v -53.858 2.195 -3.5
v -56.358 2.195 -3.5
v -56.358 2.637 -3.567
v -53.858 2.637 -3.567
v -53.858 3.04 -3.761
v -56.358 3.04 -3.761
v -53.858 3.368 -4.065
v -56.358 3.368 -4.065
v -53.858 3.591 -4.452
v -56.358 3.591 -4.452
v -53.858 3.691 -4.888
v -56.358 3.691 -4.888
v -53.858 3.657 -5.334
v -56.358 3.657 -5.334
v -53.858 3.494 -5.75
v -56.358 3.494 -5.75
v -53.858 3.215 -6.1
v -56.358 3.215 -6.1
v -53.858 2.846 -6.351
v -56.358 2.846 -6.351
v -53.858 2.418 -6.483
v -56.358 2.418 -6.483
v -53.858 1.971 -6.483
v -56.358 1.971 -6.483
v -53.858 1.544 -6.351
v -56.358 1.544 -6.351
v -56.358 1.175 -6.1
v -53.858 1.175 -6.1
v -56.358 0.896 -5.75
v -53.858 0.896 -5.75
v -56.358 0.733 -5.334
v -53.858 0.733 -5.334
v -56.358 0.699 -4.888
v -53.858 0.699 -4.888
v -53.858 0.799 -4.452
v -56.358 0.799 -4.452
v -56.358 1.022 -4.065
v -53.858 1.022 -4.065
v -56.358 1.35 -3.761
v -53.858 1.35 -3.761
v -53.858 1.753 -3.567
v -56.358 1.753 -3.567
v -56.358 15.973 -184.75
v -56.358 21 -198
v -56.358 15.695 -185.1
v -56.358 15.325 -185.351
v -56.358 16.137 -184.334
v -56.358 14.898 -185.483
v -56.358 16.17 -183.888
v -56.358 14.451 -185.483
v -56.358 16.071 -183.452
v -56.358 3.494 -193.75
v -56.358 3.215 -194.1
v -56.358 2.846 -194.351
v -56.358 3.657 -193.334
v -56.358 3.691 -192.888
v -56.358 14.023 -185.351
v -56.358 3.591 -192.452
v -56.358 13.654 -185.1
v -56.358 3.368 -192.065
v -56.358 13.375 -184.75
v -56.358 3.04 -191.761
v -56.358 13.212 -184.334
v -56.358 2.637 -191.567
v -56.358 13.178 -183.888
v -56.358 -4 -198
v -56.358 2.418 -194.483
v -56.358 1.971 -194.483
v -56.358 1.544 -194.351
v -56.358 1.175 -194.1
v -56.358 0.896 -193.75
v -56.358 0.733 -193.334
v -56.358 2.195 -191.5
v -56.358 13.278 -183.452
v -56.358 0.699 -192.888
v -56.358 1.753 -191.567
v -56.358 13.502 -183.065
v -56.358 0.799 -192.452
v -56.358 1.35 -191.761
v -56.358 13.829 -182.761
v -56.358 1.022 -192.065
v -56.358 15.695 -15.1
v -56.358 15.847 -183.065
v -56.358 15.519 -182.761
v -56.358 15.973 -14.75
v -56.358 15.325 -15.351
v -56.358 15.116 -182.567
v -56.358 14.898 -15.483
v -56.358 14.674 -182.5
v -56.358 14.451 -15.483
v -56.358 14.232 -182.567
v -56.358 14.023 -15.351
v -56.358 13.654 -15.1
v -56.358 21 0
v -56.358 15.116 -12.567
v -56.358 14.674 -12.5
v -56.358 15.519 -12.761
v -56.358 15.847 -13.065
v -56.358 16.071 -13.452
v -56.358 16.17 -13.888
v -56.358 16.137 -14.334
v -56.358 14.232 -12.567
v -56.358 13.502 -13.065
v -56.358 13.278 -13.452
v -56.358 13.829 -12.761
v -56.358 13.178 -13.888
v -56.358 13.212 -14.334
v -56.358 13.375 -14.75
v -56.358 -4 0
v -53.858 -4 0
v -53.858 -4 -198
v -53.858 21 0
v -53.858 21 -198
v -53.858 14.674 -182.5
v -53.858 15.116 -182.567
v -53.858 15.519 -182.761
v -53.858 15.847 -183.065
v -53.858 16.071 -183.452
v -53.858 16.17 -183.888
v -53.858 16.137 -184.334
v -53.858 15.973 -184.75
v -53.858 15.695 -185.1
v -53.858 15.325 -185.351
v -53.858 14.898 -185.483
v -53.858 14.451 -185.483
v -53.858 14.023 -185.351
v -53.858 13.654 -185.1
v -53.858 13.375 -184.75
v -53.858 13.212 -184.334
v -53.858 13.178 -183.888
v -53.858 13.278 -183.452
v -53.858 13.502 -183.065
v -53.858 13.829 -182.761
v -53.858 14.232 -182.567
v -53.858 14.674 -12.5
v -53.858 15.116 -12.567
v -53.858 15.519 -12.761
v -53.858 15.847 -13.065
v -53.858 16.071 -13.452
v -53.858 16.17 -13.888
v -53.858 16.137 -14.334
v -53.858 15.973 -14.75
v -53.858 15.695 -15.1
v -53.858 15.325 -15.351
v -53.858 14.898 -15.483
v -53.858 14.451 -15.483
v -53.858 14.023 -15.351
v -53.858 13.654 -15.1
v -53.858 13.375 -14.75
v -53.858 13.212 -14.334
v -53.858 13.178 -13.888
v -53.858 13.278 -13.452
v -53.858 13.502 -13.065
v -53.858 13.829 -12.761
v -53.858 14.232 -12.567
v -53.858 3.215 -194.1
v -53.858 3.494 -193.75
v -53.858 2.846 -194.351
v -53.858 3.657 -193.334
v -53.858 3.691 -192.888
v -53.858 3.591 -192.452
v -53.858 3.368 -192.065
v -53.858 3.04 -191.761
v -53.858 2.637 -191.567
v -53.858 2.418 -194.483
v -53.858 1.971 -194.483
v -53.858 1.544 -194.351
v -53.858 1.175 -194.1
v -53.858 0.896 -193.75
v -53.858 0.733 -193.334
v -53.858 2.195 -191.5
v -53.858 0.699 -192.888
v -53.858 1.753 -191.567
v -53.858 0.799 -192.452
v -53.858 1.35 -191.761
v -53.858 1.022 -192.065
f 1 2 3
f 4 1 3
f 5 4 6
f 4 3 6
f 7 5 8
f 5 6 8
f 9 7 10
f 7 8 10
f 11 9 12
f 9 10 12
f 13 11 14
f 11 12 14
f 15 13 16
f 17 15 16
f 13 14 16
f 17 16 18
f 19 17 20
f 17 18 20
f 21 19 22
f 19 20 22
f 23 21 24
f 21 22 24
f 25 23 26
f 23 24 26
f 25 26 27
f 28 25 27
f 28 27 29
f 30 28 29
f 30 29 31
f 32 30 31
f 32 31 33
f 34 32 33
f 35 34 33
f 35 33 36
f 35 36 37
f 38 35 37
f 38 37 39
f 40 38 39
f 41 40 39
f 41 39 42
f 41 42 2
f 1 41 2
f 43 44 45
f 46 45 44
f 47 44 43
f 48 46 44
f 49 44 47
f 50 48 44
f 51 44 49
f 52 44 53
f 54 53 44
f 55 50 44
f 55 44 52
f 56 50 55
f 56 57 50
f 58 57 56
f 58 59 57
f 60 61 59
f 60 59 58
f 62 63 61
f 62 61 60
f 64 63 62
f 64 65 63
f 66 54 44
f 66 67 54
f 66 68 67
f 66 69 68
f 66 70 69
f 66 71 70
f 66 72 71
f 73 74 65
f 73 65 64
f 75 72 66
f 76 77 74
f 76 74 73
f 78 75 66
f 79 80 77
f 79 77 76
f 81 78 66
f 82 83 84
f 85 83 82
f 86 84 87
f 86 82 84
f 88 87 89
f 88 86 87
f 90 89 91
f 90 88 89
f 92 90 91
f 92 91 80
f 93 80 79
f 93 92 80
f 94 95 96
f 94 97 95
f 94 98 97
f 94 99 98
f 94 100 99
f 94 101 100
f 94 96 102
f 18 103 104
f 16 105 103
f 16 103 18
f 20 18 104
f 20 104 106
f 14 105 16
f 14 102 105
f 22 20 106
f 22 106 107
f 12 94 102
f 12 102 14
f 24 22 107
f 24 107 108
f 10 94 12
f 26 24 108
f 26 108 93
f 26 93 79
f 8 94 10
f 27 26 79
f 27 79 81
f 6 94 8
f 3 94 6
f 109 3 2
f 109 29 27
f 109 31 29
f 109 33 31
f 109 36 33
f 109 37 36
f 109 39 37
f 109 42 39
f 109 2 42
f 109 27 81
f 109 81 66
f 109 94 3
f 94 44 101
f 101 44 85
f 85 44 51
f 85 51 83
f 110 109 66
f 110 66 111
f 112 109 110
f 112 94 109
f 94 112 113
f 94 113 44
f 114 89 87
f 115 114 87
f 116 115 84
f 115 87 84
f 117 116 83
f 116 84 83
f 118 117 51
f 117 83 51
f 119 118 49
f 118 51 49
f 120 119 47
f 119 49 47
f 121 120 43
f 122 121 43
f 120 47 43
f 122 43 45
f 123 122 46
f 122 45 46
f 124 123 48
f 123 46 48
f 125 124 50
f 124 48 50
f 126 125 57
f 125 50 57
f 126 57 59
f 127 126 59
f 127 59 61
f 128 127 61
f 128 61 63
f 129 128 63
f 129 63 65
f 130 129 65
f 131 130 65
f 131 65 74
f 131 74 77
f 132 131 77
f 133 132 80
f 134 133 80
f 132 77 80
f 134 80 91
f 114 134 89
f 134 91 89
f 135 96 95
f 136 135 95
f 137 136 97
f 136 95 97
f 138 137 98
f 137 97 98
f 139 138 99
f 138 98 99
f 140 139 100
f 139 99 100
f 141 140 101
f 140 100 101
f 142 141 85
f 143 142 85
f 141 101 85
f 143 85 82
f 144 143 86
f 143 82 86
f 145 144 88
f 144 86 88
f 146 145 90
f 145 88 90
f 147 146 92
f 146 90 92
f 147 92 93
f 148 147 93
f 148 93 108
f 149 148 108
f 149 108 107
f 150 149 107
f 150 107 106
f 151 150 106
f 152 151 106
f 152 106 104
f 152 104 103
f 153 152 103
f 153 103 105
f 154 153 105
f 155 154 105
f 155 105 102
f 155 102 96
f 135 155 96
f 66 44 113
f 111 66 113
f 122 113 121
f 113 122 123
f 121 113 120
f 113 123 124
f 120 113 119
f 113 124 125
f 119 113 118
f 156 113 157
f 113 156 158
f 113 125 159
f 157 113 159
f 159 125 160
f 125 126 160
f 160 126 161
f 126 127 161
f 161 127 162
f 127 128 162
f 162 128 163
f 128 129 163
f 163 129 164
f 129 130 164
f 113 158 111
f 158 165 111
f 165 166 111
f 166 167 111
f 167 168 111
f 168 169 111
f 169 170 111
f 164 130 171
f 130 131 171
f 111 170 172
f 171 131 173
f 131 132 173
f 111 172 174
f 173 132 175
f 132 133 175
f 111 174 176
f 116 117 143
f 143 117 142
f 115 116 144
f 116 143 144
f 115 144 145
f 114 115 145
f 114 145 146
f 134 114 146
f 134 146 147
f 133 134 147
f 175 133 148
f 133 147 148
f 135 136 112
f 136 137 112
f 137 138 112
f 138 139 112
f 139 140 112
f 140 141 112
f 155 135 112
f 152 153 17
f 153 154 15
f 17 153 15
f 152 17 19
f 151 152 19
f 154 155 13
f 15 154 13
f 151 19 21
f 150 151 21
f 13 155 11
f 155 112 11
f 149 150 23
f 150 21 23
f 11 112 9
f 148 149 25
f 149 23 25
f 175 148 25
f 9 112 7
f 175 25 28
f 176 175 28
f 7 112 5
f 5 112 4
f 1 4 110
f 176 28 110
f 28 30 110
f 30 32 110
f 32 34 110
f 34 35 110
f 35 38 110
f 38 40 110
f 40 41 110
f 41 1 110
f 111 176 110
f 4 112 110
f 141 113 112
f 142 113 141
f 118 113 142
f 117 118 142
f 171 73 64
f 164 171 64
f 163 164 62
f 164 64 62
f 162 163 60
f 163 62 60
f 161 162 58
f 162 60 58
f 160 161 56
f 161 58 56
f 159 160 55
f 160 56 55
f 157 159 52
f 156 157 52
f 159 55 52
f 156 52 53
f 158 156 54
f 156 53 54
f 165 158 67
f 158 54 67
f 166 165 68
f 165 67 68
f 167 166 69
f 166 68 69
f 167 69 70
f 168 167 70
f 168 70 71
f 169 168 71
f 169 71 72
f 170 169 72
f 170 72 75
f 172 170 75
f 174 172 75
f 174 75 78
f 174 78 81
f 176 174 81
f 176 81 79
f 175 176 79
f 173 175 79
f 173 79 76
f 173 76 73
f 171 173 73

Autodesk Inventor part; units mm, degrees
ref_plane "YZ Plane" through (0, 0, 0) normal (1, 0, 0) x (0, 1, 0)
ref_plane "XZ Plane" through (0, 0, 0) normal (0, 1, 0) x (-1, 0, 0)
sketch "スケッチ1" plane through (0, 0, 0) normal (0, 0, 1) x (1, 0, 0)
  line L0 (-53.8577, -21) -> (53.8577, -21) projected
  line L1 (53.8577, -21) -> (53.8577, -19.5) projected
  line L2 (53.8577, -19.5) -> (45.423, -16.1743) projected
  line L3 (45.423, -16.1743) -> (44.506, -18.5) projected
  line L4 (44.506, -18.5) -> (-49.7747, 18.6743) projected
  line L5 (-49.7747, 18.6743) -> (-48.8577, 21) projected
  line L6 (-48.8577, 21) -> (-53.8577, 21) projected
  line L7 (-53.8577, 21) -> (-53.8577, -21) projected
  line L8 (-42.0411, 10.2503) -> (14.7433, -12.1394) projected
  arc A0 (14.0097, -16) -> (14.7433, -12.1394) centre (14.0097, -14) ccw projected
  line L9 (14.0097, -16) -> (-42.7747, -16) projected
  arc A1 (-44.7747, -14) -> (-42.7747, -16) centre (-42.7747, -14) ccw projected
  line L10 (-44.7747, -14) -> (-44.7747, 8.3897) projected
  arc A2 (-42.0411, 10.2503) -> (-44.7747, 8.3897) centre (-42.7747, 8.3897) ccw projected
  arc A3 (-76.8577, -9) -> (-66.8577, -11) centre (-66.8577, 15) ccw projected
  arc A4 (-86.8577, -11) -> (-76.8577, -9) centre (-86.8577, 15) ccw projected
  line L11 (-86.8577, -13) -> (-86.8577, -11) projected
  line L12 (-86.8577, -13) -> (-66.8577, -13) projected
  line L13 (-66.8577, -21) -> (-66.8577, -13) projected
  line L14 (-53.8577, -21) -> (-66.8577, -21) projected
  line L15 (-53.8577, -4) -> (-53.8577, -21) projected
  line L16 (-56.8577, -4) -> (-53.8577, -4) projected
  line L17 (-56.8577, -11) -> (-56.8577, -4) projected
  line L18 (-66.8577, -11) -> (-56.8577, -11) projected
  line L19 (-53.8577, 21) -> (-56.3577, 21)
  line L20 (-56.3577, 21) -> (-56.3577, -4)
  line L21 (-56.3577, -4) -> (-53.8577, -4)
  line L22 (-53.8577, -4) -> (-53.8577, 21)
  point P0 (0, 0)
  dimension "d0" = 2.5
ref_plane "作業平面1" through (-53.8577, -21, -198) normal (0, 0, -1) x (0, 1, 0)
extrude "押し出し1" add sketch "スケッチ1" against normal up to surface (198 mm away) contours L16 L20 L19 L7
sketch "スケッチ2" plane through (-56.3577, -4, 0) normal (-1, 0, 0) x (0, 0, 1)
  line L0 (-198, 25) -> (-198, 0) projected
  line L1 (0, 0) -> (-198, 0) projected
  line L2 (0, 25) -> (0, 0) projected
  line L3 (0, 25) -> (-198, 25) projected
  line L4 (-198, -10) -> (-188, -10) projected
  line L5 (-198, 12.3897) -> (-198, -10) projected
  line L6 (-188, 12.3897) -> (-198, 12.3897) projected
  line L7 (-188, -10) -> (-188, 12.3897) projected
  line L8 (-10, -10) -> (0, -10) projected
  line L9 (-10, 12.3897) -> (-10, -10) projected
  line L10 (0, 12.3897) -> (-10, 12.3897) projected
  line L11 (0, -10) -> (0, 12.3897) projected
  line L12 (0, 0) -> (-198, 0) projected
  line L13 (-198, 12.3897) -> (-188, 12.3897)
  line L14 (-188, 12.3897) -> (-188, 0)
  line L15 (-188, 0) -> (-198, 0)
  line L16 (-198, 0) -> (-198, 12.3897)
  line L17 (0, 12.3897) -> (-10, 12.3897)
  line L18 (-10, 12.3897) -> (-10, 0)
  line L19 (-10, 0) -> (0, 0)
  line L20 (0, 0) -> (0, 12.3897)
  circle A0 centre (-193, 6.1949) radius 1.5
  circle A1 centre (-5, 6.1949) radius 1.5
  point P0 (0, 4)
  dimension "d3" = 3
  dimension "d4" = 3
extrude "押し出し2" cut sketch "スケッチ2" against normal blind 2.5 contours A0 | A1
sketch "スケッチ3" plane through (-56.3577, -4, 0) normal (-1, 0, 0) x (0, 0, 1)
  circle A0 centre (-184, 18.6743) radius 1.5 projected
  circle A1 centre (-14, 18.6743) radius 1.5 projected
  point P0 (0, 4)
extrude "押し出し3" cut sketch "スケッチ3" against normal blind 2.5
properties part number "Side_Wall_Riner" material "木材 (カエデ材)"
